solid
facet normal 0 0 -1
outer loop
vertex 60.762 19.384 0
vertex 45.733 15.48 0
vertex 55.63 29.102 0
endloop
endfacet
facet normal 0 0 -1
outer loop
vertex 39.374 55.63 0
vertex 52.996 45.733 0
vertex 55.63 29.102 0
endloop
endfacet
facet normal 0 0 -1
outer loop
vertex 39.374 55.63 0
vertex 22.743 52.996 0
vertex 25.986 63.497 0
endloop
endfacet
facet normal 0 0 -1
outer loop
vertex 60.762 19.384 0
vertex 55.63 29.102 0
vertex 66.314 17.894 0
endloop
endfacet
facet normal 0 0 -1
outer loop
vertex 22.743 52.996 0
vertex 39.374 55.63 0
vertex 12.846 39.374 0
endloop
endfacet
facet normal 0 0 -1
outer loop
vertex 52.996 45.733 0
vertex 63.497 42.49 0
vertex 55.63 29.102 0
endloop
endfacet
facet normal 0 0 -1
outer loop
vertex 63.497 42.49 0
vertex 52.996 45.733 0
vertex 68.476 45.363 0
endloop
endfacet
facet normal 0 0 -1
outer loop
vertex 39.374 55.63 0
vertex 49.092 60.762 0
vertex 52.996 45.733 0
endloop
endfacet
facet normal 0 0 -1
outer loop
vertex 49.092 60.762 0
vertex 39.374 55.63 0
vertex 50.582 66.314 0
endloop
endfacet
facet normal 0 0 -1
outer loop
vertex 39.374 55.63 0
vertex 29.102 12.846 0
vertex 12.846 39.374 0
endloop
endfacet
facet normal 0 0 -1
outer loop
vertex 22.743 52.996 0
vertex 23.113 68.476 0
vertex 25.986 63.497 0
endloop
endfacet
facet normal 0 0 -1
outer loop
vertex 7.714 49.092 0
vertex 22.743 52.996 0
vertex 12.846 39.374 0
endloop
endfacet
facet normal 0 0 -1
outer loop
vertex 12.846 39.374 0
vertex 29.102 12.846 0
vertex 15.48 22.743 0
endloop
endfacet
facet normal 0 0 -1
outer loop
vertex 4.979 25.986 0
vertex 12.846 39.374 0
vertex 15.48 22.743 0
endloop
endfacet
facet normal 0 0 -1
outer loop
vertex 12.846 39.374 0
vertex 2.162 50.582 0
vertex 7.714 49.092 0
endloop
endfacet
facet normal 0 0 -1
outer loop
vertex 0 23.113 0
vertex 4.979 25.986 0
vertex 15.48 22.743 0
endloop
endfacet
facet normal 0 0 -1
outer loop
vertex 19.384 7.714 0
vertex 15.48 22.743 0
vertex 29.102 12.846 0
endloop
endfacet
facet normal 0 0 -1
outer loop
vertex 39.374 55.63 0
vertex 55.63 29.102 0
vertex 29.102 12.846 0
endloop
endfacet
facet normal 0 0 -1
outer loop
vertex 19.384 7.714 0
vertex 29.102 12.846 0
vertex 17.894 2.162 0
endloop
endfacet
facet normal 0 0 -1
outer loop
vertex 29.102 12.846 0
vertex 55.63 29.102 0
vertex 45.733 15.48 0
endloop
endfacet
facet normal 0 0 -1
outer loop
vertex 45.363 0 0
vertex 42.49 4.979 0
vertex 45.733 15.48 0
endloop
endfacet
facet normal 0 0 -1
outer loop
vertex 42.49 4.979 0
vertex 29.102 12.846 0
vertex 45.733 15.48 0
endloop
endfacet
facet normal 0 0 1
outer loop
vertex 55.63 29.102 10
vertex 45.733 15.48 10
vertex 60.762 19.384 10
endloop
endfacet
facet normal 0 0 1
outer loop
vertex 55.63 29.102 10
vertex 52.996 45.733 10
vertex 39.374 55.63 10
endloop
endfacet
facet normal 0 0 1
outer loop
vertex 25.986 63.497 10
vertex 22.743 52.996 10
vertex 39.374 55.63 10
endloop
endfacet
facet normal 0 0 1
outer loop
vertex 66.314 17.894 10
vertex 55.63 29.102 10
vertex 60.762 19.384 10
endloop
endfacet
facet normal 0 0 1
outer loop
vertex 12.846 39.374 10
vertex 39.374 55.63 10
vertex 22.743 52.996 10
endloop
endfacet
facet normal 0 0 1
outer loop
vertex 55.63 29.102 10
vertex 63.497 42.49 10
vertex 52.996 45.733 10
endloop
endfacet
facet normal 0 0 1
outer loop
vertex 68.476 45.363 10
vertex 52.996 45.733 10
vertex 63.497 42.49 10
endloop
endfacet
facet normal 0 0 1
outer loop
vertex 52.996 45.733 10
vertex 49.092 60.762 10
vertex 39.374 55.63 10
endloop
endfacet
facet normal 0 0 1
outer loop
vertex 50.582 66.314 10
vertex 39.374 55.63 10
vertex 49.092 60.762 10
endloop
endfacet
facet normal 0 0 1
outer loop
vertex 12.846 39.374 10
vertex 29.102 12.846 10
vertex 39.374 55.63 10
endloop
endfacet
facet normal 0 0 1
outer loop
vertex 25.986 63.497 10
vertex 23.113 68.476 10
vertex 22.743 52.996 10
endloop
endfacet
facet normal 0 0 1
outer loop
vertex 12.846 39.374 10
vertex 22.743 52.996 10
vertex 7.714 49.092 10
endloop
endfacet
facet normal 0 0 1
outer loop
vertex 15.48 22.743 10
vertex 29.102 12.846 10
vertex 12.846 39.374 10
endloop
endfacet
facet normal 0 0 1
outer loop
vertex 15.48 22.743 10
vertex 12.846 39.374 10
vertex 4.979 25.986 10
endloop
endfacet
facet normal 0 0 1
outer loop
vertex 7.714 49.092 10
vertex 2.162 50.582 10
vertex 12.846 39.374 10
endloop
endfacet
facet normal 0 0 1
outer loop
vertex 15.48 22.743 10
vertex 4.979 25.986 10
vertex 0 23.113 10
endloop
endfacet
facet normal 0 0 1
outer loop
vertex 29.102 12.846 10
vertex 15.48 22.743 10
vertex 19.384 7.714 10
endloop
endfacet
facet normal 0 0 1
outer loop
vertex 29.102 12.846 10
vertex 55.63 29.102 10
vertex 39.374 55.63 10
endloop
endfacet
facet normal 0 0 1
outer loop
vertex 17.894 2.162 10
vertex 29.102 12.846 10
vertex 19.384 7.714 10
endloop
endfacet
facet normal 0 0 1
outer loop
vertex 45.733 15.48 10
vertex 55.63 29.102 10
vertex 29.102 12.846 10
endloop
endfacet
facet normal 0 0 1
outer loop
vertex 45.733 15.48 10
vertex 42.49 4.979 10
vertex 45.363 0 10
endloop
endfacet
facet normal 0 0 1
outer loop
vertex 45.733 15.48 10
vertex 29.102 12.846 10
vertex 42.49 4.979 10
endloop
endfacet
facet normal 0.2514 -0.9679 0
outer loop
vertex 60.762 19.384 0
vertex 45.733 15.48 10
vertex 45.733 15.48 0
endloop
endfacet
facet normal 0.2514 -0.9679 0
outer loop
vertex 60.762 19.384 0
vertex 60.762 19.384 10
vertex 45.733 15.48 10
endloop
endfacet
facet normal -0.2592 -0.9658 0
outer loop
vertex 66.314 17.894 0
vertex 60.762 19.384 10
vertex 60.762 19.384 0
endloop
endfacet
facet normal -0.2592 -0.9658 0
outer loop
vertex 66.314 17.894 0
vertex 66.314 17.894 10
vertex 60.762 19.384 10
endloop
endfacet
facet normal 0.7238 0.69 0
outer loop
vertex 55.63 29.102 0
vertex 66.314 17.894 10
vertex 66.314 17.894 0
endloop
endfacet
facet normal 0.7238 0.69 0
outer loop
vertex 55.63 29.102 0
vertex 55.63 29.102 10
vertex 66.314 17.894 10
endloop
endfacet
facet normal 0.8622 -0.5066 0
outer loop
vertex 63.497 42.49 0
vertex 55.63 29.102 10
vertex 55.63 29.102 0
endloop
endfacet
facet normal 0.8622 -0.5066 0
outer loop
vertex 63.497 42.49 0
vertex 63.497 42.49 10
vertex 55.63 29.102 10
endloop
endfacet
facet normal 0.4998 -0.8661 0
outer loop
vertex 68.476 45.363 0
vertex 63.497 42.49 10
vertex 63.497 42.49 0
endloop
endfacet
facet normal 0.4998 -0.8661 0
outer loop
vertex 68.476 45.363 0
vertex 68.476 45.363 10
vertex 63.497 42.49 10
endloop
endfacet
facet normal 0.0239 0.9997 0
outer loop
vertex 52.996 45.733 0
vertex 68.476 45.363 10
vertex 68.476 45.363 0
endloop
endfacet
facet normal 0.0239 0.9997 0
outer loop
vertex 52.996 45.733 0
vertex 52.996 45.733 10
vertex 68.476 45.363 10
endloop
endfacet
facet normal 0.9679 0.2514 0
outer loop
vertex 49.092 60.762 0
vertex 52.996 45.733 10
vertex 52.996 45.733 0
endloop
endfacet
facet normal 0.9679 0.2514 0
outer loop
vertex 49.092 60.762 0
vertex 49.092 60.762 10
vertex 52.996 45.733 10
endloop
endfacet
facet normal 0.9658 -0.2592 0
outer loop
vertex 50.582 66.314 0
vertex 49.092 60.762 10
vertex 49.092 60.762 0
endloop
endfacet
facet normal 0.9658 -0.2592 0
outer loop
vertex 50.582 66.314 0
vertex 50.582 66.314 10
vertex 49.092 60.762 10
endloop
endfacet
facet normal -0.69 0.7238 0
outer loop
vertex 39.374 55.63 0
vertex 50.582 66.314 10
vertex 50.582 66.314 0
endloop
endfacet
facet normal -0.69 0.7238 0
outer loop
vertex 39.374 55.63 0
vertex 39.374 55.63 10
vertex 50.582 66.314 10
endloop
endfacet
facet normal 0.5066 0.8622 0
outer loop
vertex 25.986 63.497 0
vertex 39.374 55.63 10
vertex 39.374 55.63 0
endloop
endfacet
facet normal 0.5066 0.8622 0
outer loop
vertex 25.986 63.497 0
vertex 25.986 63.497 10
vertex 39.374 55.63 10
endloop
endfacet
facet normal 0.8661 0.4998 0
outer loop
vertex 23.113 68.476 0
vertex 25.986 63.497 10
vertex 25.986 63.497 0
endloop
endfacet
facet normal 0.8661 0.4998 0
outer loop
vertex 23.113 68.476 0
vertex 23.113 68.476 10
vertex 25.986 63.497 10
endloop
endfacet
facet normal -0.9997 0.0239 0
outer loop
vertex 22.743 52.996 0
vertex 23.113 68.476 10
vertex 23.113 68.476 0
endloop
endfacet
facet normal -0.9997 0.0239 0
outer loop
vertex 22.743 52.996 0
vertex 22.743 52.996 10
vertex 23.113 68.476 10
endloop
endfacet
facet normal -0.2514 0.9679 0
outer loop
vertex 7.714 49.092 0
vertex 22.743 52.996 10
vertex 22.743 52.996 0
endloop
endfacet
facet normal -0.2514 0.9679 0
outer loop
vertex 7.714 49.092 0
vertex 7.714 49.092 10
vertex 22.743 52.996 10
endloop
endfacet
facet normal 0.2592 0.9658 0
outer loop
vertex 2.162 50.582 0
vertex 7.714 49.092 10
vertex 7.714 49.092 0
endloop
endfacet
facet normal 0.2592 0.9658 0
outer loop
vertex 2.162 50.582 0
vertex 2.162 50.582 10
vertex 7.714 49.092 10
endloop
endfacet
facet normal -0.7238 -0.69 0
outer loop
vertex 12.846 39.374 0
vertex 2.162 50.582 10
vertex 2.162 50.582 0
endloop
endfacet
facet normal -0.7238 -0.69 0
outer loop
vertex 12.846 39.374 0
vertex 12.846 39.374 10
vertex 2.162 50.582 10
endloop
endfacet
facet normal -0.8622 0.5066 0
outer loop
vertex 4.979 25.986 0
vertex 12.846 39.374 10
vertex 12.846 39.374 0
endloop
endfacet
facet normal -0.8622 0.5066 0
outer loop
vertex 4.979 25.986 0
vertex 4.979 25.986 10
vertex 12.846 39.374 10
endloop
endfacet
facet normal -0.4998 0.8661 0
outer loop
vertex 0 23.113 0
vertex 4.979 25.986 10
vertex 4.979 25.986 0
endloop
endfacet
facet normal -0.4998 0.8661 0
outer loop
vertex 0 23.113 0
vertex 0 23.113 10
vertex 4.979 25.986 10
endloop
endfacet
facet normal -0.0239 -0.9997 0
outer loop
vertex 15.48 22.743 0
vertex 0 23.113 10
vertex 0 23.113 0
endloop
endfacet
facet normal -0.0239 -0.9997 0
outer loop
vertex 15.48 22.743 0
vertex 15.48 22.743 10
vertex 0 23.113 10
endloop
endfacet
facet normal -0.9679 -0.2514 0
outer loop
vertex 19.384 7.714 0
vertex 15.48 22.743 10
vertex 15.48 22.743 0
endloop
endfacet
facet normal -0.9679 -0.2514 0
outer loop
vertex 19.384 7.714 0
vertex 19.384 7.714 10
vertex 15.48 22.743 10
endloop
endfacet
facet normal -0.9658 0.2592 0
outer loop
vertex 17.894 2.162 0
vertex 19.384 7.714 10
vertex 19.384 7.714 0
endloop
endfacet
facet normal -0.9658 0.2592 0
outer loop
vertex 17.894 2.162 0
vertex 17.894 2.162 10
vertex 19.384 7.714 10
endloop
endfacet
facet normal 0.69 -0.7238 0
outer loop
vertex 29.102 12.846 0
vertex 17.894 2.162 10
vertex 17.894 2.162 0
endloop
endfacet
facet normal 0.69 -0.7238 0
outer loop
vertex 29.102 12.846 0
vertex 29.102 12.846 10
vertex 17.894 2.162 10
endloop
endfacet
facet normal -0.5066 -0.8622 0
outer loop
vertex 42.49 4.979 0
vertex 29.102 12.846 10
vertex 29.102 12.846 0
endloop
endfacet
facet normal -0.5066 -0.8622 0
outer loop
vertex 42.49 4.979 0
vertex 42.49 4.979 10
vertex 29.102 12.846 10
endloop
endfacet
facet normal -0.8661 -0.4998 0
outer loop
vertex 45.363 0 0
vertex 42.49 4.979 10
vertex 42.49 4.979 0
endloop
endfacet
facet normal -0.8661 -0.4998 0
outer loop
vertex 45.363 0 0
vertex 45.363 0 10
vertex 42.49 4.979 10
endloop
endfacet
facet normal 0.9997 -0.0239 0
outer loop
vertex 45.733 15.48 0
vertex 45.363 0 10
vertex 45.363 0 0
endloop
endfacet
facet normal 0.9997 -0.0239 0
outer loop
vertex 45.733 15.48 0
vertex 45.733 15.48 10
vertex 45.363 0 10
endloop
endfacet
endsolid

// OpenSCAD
$fn = 32;

// ----------------------------------------------------------------------
// Fan rotor section: 8 blades, 22 mm hub radius, 14 mm blades
// ----------------------------------------------------------------------

// --- parameters (mm) ---
profile_height = 10;      // extrusion height
profile_points = 24;      // points of the closed outline

profile = [[55.63, 29.102], [63.497, 42.49], [68.476, 45.363], [52.996, 45.733], [49.092, 60.762], [50.582, 66.314], [39.374, 55.63], [25.986, 63.497], [23.113, 68.476], [22.743, 52.996], [7.714, 49.092], [2.162, 50.582], [12.846, 39.374], [4.979, 25.986], [0, 23.113], [15.48, 22.743], [19.384, 7.714], [17.894, 2.162], [29.102, 12.846], [42.49, 4.979], [45.363, 0], [45.733, 15.48], [60.762, 19.384], [66.314, 17.894]];  // single closed polygon, 24 points, counter clockwise

// --- the one profile operation ---
linear_extrude(height = profile_height) polygon(points = profile);
